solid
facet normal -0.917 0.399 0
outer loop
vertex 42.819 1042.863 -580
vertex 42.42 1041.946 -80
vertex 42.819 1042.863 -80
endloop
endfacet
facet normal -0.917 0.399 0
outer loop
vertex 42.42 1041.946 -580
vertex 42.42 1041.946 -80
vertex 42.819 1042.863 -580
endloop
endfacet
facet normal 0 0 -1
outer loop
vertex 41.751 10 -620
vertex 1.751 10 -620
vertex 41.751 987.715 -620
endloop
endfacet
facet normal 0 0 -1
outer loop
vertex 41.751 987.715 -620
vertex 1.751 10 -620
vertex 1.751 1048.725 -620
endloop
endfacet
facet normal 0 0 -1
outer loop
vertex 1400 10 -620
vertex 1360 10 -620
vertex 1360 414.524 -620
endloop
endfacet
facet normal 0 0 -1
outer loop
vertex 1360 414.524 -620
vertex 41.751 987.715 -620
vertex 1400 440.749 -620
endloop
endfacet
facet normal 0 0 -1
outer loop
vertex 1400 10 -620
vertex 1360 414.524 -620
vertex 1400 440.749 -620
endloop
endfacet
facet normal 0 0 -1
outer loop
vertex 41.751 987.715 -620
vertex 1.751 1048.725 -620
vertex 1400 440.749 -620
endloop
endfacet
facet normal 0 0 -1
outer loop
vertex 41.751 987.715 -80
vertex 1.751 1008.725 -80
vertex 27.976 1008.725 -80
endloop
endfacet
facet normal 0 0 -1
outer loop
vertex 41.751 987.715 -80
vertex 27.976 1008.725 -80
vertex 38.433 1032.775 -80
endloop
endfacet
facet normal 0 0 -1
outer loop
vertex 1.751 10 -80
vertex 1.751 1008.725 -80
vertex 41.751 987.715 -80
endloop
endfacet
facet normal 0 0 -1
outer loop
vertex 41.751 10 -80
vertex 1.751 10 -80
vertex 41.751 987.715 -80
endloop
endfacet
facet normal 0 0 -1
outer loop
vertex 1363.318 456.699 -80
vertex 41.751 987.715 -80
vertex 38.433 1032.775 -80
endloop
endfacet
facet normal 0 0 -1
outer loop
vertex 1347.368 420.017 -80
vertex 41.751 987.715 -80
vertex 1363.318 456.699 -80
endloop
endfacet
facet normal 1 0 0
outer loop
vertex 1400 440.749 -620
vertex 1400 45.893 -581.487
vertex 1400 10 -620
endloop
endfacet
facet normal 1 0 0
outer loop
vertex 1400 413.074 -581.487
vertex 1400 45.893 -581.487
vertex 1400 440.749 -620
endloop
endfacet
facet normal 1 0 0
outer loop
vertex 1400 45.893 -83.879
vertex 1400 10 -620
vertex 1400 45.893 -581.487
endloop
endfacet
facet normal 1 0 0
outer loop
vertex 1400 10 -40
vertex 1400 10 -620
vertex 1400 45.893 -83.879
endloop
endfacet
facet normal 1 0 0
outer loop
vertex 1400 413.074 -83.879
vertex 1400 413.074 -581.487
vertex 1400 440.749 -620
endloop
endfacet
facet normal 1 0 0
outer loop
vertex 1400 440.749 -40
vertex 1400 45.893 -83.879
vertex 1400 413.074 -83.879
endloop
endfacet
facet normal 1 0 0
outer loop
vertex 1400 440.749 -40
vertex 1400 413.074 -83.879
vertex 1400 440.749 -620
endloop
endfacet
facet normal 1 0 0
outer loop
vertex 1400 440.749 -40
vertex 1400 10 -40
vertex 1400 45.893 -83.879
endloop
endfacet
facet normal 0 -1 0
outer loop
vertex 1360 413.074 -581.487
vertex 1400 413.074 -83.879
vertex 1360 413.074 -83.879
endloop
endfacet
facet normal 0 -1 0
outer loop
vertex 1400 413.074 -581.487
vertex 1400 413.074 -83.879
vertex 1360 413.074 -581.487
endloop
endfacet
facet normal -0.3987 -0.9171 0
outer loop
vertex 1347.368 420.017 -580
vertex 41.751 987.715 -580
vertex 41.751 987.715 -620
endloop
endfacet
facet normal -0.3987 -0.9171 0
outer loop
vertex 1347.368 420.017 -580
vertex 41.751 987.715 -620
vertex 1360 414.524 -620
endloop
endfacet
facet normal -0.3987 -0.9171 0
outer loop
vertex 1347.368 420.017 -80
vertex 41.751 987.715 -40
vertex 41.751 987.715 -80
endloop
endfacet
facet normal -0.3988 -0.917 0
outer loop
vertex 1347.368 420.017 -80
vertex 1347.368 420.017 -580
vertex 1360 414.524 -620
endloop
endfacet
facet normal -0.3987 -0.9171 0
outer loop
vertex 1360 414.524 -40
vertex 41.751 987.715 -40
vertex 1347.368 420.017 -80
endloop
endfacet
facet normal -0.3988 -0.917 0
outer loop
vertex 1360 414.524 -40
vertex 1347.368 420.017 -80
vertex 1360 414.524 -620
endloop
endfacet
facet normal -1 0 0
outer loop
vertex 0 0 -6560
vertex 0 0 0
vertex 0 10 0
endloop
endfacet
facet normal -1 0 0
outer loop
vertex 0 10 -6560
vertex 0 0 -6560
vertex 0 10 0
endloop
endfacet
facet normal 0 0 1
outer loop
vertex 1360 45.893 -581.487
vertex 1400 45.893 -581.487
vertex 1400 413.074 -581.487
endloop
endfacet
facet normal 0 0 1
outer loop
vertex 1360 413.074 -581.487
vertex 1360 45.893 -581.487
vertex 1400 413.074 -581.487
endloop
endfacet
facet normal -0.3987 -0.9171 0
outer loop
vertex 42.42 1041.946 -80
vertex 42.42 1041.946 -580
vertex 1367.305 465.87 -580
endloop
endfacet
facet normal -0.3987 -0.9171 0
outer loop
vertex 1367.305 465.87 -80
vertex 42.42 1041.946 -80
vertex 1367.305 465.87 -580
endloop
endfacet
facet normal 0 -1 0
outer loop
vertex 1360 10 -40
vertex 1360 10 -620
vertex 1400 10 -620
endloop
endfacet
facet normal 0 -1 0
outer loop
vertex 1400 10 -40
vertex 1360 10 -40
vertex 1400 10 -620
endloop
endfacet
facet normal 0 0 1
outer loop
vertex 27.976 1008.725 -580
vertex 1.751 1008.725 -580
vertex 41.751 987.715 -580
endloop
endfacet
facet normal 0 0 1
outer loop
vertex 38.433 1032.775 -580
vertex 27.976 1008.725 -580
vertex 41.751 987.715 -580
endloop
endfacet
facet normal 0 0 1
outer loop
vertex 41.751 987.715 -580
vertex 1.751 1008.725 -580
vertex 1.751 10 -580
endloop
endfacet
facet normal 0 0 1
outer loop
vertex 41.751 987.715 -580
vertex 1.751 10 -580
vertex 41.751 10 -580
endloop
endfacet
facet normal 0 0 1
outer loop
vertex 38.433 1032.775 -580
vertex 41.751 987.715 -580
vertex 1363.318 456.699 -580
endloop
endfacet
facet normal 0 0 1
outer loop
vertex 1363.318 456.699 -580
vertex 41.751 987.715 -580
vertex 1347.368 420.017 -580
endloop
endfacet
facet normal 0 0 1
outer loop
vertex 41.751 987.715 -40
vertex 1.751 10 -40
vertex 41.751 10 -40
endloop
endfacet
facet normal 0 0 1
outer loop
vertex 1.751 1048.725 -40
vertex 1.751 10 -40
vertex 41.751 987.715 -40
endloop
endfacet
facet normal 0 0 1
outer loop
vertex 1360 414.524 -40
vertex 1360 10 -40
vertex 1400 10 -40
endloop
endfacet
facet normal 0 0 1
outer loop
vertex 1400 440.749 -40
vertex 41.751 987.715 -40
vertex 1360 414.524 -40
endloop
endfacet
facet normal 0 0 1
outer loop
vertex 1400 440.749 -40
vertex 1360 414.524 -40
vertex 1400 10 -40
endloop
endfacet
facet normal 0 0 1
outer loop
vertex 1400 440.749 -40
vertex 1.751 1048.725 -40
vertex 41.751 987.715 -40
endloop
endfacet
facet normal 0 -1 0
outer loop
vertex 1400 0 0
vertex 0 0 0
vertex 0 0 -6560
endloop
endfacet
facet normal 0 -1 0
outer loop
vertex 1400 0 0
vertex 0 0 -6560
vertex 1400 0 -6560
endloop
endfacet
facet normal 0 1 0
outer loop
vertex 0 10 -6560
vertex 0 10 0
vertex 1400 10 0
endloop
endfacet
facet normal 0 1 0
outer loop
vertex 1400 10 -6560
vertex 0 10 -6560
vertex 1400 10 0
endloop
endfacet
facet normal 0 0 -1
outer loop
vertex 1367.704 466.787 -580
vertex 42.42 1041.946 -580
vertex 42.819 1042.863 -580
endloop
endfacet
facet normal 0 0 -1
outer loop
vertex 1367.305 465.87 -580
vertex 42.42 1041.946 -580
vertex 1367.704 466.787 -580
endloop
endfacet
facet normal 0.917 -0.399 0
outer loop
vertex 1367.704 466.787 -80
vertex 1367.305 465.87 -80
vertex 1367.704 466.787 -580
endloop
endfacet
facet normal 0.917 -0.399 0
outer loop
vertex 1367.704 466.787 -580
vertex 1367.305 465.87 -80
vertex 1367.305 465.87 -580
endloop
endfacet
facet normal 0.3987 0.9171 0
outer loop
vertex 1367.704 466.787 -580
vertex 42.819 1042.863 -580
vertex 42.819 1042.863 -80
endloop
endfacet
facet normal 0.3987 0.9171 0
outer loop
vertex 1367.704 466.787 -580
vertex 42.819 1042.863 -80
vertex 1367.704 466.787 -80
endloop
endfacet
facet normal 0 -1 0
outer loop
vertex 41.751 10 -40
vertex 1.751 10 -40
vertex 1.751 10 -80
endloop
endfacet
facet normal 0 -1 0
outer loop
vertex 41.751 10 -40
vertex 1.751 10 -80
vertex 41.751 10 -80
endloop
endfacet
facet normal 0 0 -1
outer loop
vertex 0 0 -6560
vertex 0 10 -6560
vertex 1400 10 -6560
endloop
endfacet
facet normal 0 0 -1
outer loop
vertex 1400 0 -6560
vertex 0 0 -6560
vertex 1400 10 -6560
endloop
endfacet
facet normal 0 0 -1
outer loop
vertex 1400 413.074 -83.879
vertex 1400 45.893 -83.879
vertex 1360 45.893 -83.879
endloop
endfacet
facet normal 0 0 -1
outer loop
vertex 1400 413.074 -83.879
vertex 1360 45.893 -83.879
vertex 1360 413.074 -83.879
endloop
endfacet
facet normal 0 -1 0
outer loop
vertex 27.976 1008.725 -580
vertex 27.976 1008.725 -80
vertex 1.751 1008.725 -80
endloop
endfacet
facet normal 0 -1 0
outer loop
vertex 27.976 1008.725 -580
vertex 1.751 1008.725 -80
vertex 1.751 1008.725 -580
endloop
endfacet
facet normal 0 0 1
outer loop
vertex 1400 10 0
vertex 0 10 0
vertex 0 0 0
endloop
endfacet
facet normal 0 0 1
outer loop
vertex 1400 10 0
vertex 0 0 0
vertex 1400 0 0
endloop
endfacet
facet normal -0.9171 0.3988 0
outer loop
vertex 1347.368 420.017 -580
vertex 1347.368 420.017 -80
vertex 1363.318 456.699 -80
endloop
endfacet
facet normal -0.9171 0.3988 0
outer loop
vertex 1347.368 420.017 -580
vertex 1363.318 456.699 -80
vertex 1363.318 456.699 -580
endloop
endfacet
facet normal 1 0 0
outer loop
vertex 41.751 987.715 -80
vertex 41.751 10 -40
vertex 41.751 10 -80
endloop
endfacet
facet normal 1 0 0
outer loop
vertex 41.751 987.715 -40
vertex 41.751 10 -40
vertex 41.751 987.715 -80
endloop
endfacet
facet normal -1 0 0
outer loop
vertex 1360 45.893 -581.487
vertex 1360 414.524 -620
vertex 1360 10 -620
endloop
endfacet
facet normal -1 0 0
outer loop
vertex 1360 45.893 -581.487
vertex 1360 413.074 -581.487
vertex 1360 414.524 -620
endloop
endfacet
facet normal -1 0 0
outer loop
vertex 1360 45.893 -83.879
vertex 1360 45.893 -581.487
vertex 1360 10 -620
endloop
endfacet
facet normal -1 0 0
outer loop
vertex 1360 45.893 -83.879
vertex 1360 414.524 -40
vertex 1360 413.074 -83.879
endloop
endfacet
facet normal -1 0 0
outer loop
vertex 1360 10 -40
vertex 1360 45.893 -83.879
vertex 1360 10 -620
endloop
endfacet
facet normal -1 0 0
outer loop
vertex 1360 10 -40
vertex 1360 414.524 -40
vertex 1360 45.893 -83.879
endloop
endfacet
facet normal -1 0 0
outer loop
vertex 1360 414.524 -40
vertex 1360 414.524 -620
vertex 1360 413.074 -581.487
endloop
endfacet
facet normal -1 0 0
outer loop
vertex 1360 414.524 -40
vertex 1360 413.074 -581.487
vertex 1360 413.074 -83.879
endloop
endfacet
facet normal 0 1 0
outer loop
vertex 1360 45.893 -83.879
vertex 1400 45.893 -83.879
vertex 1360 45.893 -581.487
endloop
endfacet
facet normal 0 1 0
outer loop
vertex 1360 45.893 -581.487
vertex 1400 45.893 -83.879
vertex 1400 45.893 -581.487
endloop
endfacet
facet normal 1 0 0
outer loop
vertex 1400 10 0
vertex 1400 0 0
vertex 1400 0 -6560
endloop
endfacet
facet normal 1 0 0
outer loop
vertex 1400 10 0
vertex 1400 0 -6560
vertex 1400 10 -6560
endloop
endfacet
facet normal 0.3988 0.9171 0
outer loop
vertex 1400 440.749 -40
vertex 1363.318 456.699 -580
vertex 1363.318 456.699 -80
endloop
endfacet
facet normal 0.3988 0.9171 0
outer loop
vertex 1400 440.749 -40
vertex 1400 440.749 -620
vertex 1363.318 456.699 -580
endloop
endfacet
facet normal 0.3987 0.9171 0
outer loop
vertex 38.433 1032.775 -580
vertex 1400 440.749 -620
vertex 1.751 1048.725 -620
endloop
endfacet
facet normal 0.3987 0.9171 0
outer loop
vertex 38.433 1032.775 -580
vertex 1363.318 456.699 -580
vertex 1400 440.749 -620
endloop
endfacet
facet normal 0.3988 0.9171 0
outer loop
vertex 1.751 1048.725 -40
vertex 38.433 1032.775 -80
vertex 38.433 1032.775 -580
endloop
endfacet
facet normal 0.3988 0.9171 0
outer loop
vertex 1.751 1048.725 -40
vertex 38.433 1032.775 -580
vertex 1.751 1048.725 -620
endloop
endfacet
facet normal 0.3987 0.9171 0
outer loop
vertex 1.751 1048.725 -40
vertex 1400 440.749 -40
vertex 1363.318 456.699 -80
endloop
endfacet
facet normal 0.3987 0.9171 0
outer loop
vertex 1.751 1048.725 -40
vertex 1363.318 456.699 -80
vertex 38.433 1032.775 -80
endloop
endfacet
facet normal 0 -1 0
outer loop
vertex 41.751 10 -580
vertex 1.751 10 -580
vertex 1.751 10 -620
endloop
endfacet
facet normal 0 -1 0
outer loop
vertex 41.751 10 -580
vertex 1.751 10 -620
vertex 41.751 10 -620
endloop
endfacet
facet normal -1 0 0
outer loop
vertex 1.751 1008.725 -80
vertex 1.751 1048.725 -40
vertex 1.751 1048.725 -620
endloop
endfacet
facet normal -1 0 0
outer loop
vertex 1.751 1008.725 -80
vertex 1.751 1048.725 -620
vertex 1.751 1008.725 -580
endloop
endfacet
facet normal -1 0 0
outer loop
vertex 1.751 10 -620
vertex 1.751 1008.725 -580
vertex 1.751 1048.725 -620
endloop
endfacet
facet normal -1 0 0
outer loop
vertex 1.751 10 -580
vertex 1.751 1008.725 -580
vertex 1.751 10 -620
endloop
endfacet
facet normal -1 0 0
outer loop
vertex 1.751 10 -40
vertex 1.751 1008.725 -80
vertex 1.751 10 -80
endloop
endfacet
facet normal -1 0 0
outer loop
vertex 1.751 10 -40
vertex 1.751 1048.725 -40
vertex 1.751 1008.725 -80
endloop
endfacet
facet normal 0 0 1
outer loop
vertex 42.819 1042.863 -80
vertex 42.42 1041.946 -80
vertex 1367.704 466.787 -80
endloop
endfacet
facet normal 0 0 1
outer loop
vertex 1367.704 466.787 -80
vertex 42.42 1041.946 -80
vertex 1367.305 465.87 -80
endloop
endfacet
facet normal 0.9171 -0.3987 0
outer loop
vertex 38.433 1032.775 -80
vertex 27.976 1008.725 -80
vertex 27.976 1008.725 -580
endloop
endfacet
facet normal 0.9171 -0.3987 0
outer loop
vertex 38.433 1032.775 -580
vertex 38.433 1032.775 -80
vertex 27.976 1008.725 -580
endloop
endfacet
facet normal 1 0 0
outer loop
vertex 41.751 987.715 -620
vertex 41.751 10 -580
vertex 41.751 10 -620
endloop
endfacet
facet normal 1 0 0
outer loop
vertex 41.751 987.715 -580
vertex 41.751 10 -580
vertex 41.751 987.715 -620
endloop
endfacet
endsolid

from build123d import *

# Parameters (mm, degrees)
SKETCH_1_W          = 1400
SKETCH_1_H          = 10
EXTRUDE_1_DEPTH     = 6560
EXTRUDE_START       = -40
EXTRUDE_2_DEPTH     = 580
CUT_EXTRUDE_START   = -962.442291
SKETCH_3_W          = 1444.708625949
SKETCH_3_H          = 500
CUT_EXTRUDE_2_DEPTH = 962.442291
SKETCH_4_W          = 497.60860418
SKETCH_4_H          = 367.181277729
CUT_EXTRUDE_3_DEPTH = 230
SKETCH_5_W          = 500
SKETCH_5_H          = 958.72545439
CUT_EXTRUDE_5_DEPTH = 103
SKETCH_6_W          = 1444.708625949
SKETCH_6_H          = 500
EXTRUDE_3_DEPTH     = 1


with BuildPart() as part:
    # 草圖1 → 填料-伸長1 (new body)
    with BuildSketch(Plane.XY):
        with Locations((700, 5)):
            Rectangle(SKETCH_1_W, SKETCH_1_H)
    extrude(amount=-EXTRUDE_1_DEPTH)


with BuildPart() as body_2:
    # 草圖2 → 填料-伸長2 (new body)
    with BuildSketch(Plane.XY.offset(EXTRUDE_START)):
        Polygon((1400, 10), (1400, 440.749309411), (299.527910738, 919.248192121), (1.750594072, 1048.72545439), (1.750594072, 10), (41.750594072, 10), (41.750594072, 987.715315229), (1360, 414.524160247), (1360, 10), align=None)
    extrude(amount=-EXTRUDE_2_DEPTH)

    # 草圖3 → 除料-伸長2 (cut)
    with BuildSketch(Plane(origin=(383.772967418, 882.617398947, 0), x_dir=(0.9170600743851266, -0.3987490689252403, 0), z_dir=(0.3987490689252403, 0.9170600743851266, 0)).offset(CUT_EXTRUDE_START)):
        with Locations((345.781414408, 330)):
            Rectangle(SKETCH_3_W, SKETCH_3_H)
    extrude(amount=CUT_EXTRUDE_2_DEPTH, mode=Mode.SUBTRACT)

    # 草圖4 → 除料-伸長3 (cut)
    with BuildSketch(Plane(origin=(1400, 0, 0), x_dir=(0, 0, -1), z_dir=(1, 0, 0))):
        with Locations((332.683013296, 229.483554348)):
            Rectangle(SKETCH_4_W, SKETCH_4_H)
    extrude(amount=-CUT_EXTRUDE_3_DEPTH, mode=Mode.SUBTRACT)

    # 草圖5 → 除料-伸長5 (cut)
    with BuildSketch(Plane(origin=(41.750594072, 0, 0), x_dir=(0, 0, -1), z_dir=(1, 0, 0))):
        with Locations((330, 529.362727195)):
            Rectangle(SKETCH_5_W, SKETCH_5_H)
    extrude(amount=-CUT_EXTRUDE_5_DEPTH, mode=Mode.SUBTRACT)


with BuildPart() as body_3:
    # 草圖6 → 填料-伸長3 (new body)
    with BuildSketch(Plane(origin=(387.760458107, 891.787999691, 0), x_dir=(0.9170600743851266, -0.3987490689252403, 0), z_dir=(0.3987490689252403, 0.9170600743851266, 0))):
        with Locations((345.781414408, 330)):
            Rectangle(SKETCH_6_W, SKETCH_6_H)
    extrude(amount=EXTRUDE_3_DEPTH)


solid = Compound([part.part, body_2.part, body_3.part])
